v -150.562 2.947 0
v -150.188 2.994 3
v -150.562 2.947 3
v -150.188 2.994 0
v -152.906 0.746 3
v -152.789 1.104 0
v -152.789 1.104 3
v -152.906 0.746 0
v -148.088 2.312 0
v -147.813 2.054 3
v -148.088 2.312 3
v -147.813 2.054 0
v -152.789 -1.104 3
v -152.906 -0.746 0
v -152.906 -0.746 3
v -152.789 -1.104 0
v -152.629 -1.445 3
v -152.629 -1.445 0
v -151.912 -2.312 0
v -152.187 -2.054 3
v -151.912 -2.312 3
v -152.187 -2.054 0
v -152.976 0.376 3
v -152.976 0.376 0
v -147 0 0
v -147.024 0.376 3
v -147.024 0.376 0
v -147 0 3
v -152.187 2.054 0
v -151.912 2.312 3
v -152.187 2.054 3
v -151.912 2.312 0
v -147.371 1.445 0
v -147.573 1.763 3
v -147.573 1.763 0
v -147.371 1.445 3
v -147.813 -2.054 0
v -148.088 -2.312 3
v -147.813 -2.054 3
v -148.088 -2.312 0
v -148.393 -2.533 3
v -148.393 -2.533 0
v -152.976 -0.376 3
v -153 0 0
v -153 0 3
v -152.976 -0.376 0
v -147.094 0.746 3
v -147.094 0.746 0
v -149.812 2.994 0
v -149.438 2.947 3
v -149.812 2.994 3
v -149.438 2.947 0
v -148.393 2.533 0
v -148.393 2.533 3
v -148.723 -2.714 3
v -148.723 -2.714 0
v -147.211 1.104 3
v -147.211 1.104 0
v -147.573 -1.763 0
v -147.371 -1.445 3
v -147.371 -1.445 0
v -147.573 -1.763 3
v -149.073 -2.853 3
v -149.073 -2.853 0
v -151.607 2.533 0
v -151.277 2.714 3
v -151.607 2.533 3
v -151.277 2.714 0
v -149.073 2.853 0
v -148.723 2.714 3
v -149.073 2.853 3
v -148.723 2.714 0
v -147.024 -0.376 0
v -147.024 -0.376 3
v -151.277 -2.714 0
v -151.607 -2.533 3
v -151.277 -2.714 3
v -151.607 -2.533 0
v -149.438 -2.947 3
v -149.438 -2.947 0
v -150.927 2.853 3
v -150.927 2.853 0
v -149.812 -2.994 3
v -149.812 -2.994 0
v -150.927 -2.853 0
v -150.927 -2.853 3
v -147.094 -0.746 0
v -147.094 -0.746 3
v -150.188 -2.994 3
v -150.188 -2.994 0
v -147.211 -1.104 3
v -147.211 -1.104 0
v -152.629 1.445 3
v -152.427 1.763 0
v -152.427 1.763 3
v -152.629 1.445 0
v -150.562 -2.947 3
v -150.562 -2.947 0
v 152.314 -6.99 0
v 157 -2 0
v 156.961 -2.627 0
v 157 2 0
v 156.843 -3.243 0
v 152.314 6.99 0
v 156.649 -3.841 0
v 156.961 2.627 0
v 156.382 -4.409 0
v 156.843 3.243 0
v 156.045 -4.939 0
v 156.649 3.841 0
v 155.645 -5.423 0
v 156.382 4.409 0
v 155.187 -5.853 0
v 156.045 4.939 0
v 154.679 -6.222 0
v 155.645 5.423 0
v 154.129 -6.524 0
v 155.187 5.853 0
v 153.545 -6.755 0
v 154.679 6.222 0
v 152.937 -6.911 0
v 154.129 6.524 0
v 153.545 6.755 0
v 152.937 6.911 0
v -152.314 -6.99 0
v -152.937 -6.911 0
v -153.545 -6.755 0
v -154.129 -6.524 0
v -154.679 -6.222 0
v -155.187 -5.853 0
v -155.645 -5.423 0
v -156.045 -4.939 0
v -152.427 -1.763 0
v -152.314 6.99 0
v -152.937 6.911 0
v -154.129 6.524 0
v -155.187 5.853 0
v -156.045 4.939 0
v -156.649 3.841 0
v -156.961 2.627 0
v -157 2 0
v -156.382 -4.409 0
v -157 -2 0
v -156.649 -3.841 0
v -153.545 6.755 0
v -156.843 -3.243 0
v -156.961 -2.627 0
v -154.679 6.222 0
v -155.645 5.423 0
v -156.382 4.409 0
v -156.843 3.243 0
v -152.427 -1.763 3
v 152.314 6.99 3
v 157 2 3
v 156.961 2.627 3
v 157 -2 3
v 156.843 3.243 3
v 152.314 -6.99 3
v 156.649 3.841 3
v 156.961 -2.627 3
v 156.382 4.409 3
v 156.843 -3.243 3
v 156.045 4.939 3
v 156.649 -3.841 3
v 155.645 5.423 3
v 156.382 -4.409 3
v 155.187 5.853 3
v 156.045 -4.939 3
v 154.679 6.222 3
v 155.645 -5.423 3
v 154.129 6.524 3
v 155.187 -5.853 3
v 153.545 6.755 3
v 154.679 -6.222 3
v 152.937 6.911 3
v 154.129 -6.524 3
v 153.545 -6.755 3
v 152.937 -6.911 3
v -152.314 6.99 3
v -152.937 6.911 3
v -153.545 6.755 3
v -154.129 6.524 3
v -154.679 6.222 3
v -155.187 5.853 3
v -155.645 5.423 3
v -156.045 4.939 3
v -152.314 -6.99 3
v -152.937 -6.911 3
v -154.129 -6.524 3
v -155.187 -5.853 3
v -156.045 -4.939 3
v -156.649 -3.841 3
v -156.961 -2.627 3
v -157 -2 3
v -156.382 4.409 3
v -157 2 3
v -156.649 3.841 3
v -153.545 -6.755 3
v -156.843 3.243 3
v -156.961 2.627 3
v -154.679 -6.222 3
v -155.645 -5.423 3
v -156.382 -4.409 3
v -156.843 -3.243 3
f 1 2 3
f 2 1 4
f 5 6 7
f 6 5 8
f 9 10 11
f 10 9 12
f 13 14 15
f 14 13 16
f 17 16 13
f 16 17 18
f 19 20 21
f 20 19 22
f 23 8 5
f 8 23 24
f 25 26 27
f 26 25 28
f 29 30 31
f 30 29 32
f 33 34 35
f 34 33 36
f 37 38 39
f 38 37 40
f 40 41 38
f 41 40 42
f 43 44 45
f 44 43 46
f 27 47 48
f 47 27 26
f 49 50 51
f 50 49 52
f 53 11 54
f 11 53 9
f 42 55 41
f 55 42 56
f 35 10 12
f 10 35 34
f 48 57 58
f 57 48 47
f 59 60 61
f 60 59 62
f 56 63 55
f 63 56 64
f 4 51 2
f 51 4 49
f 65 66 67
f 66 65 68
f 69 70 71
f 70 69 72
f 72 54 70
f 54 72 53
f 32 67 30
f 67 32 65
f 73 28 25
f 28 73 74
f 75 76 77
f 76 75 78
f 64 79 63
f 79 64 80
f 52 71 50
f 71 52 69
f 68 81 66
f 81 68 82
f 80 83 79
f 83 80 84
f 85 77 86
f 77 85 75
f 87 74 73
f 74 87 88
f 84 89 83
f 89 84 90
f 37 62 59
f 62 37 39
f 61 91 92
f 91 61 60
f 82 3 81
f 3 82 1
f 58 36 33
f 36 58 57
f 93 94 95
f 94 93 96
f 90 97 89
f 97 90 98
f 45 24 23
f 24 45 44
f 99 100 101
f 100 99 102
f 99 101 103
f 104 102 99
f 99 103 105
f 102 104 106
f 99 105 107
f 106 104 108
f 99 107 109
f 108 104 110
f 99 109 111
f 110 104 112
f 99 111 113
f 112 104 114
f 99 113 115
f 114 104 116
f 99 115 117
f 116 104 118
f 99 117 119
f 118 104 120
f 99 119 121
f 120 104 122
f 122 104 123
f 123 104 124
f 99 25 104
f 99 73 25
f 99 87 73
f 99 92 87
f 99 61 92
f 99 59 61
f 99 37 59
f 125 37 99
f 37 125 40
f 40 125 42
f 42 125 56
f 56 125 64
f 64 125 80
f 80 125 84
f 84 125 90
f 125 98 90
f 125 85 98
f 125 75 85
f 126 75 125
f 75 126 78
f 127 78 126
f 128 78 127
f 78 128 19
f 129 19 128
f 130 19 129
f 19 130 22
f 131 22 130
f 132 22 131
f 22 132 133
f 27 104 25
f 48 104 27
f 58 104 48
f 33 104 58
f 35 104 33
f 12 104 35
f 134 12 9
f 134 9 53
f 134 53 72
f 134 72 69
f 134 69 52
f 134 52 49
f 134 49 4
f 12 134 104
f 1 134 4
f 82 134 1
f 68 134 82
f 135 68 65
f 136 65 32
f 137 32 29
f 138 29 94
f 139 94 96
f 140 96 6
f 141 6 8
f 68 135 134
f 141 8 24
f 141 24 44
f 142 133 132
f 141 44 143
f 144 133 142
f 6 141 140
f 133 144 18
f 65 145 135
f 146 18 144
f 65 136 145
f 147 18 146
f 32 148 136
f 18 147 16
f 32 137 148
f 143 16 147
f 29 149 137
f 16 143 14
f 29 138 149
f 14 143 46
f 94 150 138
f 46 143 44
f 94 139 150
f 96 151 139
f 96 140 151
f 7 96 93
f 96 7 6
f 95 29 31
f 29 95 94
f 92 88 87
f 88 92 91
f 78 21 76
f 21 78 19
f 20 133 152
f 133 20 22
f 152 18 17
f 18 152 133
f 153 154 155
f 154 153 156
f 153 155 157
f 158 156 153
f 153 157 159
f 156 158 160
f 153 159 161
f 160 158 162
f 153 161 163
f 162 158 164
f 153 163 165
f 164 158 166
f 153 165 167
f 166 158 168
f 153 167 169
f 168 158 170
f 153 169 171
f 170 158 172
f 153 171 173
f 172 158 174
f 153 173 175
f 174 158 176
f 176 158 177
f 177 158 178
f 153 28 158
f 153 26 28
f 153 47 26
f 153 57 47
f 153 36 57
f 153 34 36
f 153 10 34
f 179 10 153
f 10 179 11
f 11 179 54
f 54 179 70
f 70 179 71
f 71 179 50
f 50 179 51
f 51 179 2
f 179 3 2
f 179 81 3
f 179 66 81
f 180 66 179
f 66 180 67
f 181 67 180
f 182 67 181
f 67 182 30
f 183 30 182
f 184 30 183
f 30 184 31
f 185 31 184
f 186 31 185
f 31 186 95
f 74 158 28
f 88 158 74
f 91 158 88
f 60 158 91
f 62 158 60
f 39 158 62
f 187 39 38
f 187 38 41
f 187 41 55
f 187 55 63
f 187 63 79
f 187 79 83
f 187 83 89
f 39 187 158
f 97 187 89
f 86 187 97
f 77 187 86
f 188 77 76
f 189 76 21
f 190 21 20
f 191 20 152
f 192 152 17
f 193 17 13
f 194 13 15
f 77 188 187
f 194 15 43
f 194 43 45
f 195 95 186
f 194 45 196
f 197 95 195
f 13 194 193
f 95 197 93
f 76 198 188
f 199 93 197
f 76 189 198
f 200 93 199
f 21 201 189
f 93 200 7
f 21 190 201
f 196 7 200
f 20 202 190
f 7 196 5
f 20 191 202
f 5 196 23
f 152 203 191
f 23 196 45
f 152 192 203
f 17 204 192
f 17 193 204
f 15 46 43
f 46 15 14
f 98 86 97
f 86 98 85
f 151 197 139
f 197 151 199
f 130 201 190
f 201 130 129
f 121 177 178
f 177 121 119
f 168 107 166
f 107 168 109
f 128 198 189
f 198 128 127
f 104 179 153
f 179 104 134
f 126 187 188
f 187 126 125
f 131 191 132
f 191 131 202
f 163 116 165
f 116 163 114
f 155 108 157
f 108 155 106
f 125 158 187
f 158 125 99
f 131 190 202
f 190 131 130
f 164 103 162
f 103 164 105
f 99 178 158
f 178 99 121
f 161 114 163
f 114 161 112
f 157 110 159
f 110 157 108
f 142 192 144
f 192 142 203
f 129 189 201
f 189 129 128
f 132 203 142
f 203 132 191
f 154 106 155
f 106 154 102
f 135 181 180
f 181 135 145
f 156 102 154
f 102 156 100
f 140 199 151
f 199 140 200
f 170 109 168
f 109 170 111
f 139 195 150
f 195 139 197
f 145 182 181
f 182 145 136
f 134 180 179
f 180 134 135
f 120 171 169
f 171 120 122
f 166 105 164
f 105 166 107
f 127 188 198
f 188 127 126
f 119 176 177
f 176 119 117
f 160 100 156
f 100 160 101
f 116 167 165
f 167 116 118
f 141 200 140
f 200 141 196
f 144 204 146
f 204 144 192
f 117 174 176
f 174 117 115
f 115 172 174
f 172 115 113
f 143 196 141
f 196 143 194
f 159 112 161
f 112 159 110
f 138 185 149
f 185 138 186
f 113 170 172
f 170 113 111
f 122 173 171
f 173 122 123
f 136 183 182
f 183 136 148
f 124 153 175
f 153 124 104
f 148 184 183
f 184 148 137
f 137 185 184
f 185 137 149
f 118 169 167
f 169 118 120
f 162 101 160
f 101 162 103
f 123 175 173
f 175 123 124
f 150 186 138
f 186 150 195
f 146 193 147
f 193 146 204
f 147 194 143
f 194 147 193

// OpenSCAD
$fn = 50;


difference() {
	union() {
		hull() {
			translate(v = [-152.0000000000, 2.0000000000, 0]) {
				cylinder(h = 3, r = 5);
			}
			translate(v = [152.0000000000, 2.0000000000, 0]) {
				cylinder(h = 3, r = 5);
			}
			translate(v = [-152.0000000000, -2.0000000000, 0]) {
				cylinder(h = 3, r = 5);
			}
			translate(v = [152.0000000000, -2.0000000000, 0]) {
				cylinder(h = 3, r = 5);
			}
		}
	}
	union() {
		translate(v = [-150.0000000000, 0.0000000000, 0]) {
			cylinder(h = 3, r = 3.0000000000);
		}
		translate(v = [-150.0000000000, 0.0000000000, 0]) {
			cylinder(h = 3, r = 1.5000000000);
		}
		translate(v = [-150.0000000000, 0.0000000000, 0]) {
			cylinder(h = 3, r = 1.5000000000);
		}
		translate(v = [-150.0000000000, 0.0000000000, 0]) {
			cylinder(h = 3, r = 1.5000000000);
		}
	}
}
